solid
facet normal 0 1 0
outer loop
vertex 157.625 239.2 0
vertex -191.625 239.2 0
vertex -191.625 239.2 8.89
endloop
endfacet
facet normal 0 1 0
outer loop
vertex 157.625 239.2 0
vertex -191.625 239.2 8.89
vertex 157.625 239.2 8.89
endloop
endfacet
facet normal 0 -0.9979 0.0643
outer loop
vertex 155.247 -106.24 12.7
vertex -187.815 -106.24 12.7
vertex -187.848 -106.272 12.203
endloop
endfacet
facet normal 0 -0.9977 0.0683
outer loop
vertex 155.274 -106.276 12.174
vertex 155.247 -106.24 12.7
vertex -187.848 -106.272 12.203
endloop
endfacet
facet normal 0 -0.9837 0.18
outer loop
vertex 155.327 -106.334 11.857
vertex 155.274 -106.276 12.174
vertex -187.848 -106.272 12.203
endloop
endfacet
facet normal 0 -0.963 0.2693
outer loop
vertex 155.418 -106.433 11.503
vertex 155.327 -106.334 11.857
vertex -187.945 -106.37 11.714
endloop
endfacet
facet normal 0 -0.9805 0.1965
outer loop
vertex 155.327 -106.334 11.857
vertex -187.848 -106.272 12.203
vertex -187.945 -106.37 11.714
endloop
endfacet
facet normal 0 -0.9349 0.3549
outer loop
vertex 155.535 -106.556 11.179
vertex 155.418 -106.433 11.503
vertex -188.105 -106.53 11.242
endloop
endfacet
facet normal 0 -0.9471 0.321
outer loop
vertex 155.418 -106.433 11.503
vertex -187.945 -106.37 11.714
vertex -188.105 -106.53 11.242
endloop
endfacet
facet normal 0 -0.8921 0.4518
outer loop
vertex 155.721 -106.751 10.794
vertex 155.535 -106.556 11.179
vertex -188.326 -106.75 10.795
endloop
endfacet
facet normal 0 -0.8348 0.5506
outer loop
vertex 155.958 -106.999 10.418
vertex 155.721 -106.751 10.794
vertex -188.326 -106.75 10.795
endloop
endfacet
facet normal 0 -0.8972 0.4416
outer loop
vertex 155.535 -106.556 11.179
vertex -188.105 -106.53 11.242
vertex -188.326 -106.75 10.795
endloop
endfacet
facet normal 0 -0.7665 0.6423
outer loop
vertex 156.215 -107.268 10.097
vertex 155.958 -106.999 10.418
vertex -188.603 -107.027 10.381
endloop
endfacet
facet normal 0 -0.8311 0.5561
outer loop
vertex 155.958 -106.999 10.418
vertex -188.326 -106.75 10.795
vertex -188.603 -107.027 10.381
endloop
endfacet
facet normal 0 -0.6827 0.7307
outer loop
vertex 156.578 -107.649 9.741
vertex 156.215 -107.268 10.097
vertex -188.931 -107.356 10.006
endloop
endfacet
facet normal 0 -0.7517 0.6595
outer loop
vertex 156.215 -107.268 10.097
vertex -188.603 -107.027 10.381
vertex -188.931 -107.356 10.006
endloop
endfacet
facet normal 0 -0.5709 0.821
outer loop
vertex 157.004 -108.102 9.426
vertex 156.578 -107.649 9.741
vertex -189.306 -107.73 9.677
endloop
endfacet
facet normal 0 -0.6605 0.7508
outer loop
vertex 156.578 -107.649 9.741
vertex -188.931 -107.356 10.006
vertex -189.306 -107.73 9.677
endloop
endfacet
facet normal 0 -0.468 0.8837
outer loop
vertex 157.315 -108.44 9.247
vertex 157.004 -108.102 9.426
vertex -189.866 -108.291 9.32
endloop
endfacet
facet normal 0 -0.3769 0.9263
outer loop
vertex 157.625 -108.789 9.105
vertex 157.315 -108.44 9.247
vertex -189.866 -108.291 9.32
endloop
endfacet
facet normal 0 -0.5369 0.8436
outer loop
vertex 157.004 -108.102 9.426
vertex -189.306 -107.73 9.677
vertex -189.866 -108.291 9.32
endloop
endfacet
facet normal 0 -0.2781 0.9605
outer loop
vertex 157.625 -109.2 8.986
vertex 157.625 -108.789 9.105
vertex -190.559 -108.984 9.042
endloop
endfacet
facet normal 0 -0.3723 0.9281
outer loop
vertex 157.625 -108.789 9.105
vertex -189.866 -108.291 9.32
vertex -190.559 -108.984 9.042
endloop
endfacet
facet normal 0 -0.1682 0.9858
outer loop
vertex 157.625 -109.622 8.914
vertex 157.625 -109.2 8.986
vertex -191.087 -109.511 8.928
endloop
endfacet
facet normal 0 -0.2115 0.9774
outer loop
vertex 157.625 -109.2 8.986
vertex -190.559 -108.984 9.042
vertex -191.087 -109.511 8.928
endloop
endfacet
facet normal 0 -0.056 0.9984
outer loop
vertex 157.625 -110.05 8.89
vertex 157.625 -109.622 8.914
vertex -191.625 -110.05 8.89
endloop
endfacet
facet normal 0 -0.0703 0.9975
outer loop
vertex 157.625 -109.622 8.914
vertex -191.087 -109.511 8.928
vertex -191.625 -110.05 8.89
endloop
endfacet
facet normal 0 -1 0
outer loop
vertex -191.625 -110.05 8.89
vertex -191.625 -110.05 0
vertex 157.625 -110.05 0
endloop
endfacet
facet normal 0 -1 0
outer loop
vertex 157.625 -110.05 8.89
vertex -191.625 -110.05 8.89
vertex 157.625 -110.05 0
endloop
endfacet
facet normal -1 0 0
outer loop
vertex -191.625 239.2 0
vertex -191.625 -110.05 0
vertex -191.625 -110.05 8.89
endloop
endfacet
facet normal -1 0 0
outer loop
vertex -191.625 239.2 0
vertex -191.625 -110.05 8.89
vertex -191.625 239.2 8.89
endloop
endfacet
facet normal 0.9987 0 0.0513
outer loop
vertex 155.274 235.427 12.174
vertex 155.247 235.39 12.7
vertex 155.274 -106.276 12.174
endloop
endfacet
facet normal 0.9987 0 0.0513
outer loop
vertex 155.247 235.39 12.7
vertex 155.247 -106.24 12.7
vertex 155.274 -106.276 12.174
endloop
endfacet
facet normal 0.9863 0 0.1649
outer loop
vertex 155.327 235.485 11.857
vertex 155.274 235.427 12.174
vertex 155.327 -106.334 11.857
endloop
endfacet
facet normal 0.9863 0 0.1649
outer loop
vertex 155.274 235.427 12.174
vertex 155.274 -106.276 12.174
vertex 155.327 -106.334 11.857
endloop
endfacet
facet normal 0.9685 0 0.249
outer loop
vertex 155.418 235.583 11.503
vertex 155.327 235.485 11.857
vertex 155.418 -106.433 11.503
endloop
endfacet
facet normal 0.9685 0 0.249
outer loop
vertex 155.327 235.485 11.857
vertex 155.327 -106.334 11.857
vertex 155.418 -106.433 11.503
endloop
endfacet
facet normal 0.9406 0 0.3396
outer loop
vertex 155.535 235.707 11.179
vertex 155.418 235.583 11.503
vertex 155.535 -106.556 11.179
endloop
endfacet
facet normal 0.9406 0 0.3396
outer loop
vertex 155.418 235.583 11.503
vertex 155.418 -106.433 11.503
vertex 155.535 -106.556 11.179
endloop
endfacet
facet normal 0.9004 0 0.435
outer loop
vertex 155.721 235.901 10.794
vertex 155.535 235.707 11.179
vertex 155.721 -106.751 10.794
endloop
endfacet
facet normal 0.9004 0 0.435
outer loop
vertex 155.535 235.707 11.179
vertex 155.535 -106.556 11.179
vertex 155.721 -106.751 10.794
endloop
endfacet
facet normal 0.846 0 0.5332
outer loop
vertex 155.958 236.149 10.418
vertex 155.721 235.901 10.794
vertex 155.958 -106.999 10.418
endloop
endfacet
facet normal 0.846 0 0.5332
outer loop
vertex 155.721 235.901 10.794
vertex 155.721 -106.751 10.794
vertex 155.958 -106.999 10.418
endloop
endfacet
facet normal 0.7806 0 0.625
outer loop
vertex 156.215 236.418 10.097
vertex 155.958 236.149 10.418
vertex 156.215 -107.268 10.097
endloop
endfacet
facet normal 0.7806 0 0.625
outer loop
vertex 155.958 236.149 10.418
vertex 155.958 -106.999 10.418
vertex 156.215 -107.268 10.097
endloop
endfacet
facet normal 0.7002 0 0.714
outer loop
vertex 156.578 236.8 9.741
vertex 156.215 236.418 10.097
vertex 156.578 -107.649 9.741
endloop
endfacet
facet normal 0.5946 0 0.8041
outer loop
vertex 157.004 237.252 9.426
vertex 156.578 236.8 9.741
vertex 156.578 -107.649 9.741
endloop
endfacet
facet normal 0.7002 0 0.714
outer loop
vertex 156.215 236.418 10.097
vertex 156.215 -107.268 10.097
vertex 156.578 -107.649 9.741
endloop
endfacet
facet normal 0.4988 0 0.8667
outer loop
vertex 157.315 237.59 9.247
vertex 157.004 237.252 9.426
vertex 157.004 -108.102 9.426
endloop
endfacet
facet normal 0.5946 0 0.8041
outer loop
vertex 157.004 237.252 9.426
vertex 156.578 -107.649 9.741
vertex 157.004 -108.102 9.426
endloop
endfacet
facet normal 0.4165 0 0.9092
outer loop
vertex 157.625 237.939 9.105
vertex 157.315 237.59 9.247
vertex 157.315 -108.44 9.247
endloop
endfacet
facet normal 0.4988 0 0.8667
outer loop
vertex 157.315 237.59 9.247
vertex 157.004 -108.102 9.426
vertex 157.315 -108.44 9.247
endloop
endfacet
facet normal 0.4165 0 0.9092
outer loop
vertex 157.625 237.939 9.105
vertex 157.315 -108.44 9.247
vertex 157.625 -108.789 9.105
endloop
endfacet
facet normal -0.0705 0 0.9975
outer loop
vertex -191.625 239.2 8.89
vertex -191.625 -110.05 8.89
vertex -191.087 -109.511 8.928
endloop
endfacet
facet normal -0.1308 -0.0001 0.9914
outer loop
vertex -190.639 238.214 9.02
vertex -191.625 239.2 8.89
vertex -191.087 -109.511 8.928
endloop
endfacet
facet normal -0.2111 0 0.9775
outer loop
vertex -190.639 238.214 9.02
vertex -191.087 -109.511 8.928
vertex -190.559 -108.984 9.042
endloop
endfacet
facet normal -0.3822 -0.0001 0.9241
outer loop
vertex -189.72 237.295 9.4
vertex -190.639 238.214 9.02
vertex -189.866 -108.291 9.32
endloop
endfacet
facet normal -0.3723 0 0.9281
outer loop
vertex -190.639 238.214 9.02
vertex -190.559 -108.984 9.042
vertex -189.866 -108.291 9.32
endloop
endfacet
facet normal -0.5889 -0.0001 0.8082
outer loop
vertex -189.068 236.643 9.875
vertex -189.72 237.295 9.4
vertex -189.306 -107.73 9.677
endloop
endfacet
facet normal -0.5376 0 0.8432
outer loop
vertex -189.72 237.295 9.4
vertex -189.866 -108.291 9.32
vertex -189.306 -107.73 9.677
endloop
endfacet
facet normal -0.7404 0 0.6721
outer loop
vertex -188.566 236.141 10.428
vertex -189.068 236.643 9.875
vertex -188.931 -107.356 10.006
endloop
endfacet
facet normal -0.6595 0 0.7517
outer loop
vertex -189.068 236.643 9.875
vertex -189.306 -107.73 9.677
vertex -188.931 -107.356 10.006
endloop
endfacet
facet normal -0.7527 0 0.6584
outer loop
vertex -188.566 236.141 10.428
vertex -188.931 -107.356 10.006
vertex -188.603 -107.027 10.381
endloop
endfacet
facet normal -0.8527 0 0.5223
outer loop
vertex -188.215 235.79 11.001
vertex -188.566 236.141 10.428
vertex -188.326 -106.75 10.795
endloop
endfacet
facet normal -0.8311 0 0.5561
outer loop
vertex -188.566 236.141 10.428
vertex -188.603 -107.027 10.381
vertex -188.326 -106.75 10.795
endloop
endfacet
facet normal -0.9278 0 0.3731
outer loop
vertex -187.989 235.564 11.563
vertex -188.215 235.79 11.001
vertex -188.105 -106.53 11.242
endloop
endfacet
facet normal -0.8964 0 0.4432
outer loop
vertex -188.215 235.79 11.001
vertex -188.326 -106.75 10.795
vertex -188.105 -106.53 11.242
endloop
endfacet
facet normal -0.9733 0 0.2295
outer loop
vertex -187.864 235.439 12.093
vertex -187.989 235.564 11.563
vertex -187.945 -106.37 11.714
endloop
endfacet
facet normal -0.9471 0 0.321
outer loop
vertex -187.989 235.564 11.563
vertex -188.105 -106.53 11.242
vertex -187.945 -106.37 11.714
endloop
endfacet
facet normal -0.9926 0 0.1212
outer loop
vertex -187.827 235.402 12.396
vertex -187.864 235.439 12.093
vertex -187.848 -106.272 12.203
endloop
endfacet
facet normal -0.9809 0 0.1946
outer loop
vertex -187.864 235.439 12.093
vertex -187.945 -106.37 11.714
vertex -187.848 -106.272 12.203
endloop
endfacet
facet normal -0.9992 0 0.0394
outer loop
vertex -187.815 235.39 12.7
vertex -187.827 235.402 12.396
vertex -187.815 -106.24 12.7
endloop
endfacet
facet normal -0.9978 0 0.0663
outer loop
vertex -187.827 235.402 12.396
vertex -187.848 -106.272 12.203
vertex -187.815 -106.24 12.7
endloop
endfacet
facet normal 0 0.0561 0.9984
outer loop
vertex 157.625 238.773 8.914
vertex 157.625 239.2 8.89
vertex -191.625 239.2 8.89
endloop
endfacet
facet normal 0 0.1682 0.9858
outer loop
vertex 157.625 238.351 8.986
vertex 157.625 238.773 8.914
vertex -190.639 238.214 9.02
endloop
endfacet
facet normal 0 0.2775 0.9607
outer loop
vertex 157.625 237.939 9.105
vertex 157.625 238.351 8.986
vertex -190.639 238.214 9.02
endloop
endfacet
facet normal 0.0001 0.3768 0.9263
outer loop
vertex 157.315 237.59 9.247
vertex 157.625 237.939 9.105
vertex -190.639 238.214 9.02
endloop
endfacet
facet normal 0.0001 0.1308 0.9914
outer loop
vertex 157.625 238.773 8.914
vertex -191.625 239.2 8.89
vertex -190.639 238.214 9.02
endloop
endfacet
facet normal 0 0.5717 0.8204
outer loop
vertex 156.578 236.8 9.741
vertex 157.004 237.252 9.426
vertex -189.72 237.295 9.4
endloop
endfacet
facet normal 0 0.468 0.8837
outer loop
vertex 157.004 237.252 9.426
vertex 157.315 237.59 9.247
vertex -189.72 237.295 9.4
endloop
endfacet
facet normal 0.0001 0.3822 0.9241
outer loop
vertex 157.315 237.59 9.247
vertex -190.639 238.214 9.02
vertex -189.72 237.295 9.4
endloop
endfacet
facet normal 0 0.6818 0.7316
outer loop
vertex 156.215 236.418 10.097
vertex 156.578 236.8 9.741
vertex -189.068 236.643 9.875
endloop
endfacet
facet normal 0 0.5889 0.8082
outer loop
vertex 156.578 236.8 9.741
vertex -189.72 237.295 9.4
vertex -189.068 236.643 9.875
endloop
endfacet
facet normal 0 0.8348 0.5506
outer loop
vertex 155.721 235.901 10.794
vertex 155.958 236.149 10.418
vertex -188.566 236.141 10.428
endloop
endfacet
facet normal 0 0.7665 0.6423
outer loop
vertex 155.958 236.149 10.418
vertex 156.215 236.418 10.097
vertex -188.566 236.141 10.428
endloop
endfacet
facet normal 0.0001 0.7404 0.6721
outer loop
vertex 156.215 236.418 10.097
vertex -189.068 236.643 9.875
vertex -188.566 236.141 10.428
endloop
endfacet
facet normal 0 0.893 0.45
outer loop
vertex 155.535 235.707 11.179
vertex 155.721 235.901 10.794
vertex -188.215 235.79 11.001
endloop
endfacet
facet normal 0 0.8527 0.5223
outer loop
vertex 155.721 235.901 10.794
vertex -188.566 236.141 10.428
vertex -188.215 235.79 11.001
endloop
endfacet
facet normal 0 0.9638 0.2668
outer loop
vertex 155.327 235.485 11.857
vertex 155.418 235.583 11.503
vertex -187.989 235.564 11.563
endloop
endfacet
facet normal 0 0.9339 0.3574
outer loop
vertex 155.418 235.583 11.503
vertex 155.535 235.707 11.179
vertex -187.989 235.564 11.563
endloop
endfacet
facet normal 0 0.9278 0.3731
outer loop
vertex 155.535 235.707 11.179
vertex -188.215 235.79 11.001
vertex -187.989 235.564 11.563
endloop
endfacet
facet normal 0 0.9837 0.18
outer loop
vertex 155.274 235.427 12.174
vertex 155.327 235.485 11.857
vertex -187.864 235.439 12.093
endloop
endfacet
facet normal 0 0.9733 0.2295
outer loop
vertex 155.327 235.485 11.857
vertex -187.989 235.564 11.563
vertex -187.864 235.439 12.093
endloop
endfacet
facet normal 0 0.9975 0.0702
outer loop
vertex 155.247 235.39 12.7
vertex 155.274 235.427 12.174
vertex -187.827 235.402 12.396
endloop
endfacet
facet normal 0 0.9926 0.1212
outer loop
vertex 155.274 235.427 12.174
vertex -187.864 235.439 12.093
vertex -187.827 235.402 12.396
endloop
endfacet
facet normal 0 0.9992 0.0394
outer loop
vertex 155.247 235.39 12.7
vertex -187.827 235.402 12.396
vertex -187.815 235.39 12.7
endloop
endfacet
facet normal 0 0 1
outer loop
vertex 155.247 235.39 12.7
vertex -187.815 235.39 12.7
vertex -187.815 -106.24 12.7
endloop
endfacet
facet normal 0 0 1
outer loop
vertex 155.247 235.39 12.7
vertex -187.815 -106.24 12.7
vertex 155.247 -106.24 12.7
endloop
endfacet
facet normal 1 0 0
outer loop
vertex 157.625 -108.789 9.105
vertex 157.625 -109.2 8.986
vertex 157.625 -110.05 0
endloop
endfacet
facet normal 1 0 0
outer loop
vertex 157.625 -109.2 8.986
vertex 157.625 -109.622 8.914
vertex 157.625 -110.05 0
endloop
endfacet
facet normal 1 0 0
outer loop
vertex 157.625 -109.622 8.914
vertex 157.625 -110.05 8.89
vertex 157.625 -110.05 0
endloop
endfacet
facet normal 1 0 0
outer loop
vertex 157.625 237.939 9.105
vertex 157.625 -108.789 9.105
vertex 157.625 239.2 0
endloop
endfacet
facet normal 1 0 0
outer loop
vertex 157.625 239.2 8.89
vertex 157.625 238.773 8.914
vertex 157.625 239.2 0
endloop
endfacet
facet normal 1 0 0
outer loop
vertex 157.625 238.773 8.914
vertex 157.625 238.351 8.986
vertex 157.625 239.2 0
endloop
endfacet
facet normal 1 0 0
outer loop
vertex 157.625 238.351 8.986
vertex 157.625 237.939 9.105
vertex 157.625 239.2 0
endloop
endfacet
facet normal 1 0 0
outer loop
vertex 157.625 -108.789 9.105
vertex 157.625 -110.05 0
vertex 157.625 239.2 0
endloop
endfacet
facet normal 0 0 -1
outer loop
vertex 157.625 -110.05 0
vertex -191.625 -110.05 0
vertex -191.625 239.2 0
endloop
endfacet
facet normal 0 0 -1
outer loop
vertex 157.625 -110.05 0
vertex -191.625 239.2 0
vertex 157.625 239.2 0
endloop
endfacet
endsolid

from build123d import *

# Parameters (mm, degrees)
F0_W      = 349.25
F0_H      = 349.25
F1_DEPTH  = 12.7
F4_DEPTH  = 349.251
F5_DEPTH  = 349.251
F3_R      = 3.81
F6_DEPTH  = 349.251
F2_R      = 3.81
F7_DEPTH  = 349.251
F8_R      = 3.81
F9_DEPTH  = 349.251
F10_R     = 3.81
F11_DEPTH = 349.251


with BuildPart() as f1:
    # F0 (on Top) → F1 (new body)
    with BuildSketch(Plane.XY):
        with Locations((-17.0002015829, 64.5751319209)):
            Rectangle(F0_W, F0_H)
    extrude(amount=F1_DEPTH)

    # F3 (on face) → F4 (cut, through all)
    with BuildSketch(Plane(origin=(-191.6252015829, 0, 0), x_dir=(0, -1, 0), z_dir=(-1, 0, 0))):
        with BuildLine():
            ThreePointArc((110.0498680791, 8.89), (112.7439449154, 10.0059231637), (113.8598680791, 12.7))
            ThreePointArc((113.8598680791, 12.7), (110.0498680791, 16.51), (106.2398680791, 12.7))
            Line((106.2398680791, 12.7), (110.0498680791, 12.7))
            Line((110.0498680791, 12.7), (110.0498680791, 8.89))
        make_face()
    extrude(amount=-F4_DEPTH, mode=Mode.SUBTRACT)

    # F2 (on face) → F5 (cut, through all)
    with BuildSketch(Plane.XZ.offset(110.0498680791)):
        with BuildLine():
            Line((-191.6252015829, 12.7), (-187.8152015829, 12.7))
            ThreePointArc((-187.8152015829, 12.7), (-194.3192784192, 15.3940768363), (-191.6252015829, 8.89))
            Line((-191.6252015829, 8.89), (-191.6252015829, 12.7))
        make_face()
    extrude(amount=-F5_DEPTH, mode=Mode.SUBTRACT)

    # F3 (on face) → F6 (cut, through all)
    with BuildSketch(Plane(origin=(-191.6252015829, 0, 0), x_dir=(0, -1, 0), z_dir=(-1, 0, 0))):
        with Locations((110.0498680791, 12.7)):
            Circle(F3_R)
        with Locations((-239.2001319209, 12.7)):
            Circle(F3_R)
    extrude(amount=-F6_DEPTH, mode=Mode.SUBTRACT)

    # F2 (on face) → F7 (cut, through all)
    with BuildSketch(Plane.XZ.offset(110.0498680791)):
        with Locations((-191.6252015829, 12.7)):
            Circle(F2_R)
    extrude(amount=-F7_DEPTH, mode=Mode.SUBTRACT)

    # F8 (on face) → F9 (cut, through all)
    with BuildSketch(Plane.XZ.offset(110.0498680791)):
        with Locations((189.3937587738, 12.5737581402)):
            Circle(F8_R)
    extrude(amount=-F9_DEPTH, mode=Mode.SUBTRACT)

    # F10 (on face) → F11 (cut, through all)
    with BuildSketch(Plane.XZ.offset(110.0498680791)):
        with Locations((159.0561419725, 12.6355821267)):
            Circle(F10_R)
    extrude(amount=-F11_DEPTH, mode=Mode.SUBTRACT)


solid = f1.part
